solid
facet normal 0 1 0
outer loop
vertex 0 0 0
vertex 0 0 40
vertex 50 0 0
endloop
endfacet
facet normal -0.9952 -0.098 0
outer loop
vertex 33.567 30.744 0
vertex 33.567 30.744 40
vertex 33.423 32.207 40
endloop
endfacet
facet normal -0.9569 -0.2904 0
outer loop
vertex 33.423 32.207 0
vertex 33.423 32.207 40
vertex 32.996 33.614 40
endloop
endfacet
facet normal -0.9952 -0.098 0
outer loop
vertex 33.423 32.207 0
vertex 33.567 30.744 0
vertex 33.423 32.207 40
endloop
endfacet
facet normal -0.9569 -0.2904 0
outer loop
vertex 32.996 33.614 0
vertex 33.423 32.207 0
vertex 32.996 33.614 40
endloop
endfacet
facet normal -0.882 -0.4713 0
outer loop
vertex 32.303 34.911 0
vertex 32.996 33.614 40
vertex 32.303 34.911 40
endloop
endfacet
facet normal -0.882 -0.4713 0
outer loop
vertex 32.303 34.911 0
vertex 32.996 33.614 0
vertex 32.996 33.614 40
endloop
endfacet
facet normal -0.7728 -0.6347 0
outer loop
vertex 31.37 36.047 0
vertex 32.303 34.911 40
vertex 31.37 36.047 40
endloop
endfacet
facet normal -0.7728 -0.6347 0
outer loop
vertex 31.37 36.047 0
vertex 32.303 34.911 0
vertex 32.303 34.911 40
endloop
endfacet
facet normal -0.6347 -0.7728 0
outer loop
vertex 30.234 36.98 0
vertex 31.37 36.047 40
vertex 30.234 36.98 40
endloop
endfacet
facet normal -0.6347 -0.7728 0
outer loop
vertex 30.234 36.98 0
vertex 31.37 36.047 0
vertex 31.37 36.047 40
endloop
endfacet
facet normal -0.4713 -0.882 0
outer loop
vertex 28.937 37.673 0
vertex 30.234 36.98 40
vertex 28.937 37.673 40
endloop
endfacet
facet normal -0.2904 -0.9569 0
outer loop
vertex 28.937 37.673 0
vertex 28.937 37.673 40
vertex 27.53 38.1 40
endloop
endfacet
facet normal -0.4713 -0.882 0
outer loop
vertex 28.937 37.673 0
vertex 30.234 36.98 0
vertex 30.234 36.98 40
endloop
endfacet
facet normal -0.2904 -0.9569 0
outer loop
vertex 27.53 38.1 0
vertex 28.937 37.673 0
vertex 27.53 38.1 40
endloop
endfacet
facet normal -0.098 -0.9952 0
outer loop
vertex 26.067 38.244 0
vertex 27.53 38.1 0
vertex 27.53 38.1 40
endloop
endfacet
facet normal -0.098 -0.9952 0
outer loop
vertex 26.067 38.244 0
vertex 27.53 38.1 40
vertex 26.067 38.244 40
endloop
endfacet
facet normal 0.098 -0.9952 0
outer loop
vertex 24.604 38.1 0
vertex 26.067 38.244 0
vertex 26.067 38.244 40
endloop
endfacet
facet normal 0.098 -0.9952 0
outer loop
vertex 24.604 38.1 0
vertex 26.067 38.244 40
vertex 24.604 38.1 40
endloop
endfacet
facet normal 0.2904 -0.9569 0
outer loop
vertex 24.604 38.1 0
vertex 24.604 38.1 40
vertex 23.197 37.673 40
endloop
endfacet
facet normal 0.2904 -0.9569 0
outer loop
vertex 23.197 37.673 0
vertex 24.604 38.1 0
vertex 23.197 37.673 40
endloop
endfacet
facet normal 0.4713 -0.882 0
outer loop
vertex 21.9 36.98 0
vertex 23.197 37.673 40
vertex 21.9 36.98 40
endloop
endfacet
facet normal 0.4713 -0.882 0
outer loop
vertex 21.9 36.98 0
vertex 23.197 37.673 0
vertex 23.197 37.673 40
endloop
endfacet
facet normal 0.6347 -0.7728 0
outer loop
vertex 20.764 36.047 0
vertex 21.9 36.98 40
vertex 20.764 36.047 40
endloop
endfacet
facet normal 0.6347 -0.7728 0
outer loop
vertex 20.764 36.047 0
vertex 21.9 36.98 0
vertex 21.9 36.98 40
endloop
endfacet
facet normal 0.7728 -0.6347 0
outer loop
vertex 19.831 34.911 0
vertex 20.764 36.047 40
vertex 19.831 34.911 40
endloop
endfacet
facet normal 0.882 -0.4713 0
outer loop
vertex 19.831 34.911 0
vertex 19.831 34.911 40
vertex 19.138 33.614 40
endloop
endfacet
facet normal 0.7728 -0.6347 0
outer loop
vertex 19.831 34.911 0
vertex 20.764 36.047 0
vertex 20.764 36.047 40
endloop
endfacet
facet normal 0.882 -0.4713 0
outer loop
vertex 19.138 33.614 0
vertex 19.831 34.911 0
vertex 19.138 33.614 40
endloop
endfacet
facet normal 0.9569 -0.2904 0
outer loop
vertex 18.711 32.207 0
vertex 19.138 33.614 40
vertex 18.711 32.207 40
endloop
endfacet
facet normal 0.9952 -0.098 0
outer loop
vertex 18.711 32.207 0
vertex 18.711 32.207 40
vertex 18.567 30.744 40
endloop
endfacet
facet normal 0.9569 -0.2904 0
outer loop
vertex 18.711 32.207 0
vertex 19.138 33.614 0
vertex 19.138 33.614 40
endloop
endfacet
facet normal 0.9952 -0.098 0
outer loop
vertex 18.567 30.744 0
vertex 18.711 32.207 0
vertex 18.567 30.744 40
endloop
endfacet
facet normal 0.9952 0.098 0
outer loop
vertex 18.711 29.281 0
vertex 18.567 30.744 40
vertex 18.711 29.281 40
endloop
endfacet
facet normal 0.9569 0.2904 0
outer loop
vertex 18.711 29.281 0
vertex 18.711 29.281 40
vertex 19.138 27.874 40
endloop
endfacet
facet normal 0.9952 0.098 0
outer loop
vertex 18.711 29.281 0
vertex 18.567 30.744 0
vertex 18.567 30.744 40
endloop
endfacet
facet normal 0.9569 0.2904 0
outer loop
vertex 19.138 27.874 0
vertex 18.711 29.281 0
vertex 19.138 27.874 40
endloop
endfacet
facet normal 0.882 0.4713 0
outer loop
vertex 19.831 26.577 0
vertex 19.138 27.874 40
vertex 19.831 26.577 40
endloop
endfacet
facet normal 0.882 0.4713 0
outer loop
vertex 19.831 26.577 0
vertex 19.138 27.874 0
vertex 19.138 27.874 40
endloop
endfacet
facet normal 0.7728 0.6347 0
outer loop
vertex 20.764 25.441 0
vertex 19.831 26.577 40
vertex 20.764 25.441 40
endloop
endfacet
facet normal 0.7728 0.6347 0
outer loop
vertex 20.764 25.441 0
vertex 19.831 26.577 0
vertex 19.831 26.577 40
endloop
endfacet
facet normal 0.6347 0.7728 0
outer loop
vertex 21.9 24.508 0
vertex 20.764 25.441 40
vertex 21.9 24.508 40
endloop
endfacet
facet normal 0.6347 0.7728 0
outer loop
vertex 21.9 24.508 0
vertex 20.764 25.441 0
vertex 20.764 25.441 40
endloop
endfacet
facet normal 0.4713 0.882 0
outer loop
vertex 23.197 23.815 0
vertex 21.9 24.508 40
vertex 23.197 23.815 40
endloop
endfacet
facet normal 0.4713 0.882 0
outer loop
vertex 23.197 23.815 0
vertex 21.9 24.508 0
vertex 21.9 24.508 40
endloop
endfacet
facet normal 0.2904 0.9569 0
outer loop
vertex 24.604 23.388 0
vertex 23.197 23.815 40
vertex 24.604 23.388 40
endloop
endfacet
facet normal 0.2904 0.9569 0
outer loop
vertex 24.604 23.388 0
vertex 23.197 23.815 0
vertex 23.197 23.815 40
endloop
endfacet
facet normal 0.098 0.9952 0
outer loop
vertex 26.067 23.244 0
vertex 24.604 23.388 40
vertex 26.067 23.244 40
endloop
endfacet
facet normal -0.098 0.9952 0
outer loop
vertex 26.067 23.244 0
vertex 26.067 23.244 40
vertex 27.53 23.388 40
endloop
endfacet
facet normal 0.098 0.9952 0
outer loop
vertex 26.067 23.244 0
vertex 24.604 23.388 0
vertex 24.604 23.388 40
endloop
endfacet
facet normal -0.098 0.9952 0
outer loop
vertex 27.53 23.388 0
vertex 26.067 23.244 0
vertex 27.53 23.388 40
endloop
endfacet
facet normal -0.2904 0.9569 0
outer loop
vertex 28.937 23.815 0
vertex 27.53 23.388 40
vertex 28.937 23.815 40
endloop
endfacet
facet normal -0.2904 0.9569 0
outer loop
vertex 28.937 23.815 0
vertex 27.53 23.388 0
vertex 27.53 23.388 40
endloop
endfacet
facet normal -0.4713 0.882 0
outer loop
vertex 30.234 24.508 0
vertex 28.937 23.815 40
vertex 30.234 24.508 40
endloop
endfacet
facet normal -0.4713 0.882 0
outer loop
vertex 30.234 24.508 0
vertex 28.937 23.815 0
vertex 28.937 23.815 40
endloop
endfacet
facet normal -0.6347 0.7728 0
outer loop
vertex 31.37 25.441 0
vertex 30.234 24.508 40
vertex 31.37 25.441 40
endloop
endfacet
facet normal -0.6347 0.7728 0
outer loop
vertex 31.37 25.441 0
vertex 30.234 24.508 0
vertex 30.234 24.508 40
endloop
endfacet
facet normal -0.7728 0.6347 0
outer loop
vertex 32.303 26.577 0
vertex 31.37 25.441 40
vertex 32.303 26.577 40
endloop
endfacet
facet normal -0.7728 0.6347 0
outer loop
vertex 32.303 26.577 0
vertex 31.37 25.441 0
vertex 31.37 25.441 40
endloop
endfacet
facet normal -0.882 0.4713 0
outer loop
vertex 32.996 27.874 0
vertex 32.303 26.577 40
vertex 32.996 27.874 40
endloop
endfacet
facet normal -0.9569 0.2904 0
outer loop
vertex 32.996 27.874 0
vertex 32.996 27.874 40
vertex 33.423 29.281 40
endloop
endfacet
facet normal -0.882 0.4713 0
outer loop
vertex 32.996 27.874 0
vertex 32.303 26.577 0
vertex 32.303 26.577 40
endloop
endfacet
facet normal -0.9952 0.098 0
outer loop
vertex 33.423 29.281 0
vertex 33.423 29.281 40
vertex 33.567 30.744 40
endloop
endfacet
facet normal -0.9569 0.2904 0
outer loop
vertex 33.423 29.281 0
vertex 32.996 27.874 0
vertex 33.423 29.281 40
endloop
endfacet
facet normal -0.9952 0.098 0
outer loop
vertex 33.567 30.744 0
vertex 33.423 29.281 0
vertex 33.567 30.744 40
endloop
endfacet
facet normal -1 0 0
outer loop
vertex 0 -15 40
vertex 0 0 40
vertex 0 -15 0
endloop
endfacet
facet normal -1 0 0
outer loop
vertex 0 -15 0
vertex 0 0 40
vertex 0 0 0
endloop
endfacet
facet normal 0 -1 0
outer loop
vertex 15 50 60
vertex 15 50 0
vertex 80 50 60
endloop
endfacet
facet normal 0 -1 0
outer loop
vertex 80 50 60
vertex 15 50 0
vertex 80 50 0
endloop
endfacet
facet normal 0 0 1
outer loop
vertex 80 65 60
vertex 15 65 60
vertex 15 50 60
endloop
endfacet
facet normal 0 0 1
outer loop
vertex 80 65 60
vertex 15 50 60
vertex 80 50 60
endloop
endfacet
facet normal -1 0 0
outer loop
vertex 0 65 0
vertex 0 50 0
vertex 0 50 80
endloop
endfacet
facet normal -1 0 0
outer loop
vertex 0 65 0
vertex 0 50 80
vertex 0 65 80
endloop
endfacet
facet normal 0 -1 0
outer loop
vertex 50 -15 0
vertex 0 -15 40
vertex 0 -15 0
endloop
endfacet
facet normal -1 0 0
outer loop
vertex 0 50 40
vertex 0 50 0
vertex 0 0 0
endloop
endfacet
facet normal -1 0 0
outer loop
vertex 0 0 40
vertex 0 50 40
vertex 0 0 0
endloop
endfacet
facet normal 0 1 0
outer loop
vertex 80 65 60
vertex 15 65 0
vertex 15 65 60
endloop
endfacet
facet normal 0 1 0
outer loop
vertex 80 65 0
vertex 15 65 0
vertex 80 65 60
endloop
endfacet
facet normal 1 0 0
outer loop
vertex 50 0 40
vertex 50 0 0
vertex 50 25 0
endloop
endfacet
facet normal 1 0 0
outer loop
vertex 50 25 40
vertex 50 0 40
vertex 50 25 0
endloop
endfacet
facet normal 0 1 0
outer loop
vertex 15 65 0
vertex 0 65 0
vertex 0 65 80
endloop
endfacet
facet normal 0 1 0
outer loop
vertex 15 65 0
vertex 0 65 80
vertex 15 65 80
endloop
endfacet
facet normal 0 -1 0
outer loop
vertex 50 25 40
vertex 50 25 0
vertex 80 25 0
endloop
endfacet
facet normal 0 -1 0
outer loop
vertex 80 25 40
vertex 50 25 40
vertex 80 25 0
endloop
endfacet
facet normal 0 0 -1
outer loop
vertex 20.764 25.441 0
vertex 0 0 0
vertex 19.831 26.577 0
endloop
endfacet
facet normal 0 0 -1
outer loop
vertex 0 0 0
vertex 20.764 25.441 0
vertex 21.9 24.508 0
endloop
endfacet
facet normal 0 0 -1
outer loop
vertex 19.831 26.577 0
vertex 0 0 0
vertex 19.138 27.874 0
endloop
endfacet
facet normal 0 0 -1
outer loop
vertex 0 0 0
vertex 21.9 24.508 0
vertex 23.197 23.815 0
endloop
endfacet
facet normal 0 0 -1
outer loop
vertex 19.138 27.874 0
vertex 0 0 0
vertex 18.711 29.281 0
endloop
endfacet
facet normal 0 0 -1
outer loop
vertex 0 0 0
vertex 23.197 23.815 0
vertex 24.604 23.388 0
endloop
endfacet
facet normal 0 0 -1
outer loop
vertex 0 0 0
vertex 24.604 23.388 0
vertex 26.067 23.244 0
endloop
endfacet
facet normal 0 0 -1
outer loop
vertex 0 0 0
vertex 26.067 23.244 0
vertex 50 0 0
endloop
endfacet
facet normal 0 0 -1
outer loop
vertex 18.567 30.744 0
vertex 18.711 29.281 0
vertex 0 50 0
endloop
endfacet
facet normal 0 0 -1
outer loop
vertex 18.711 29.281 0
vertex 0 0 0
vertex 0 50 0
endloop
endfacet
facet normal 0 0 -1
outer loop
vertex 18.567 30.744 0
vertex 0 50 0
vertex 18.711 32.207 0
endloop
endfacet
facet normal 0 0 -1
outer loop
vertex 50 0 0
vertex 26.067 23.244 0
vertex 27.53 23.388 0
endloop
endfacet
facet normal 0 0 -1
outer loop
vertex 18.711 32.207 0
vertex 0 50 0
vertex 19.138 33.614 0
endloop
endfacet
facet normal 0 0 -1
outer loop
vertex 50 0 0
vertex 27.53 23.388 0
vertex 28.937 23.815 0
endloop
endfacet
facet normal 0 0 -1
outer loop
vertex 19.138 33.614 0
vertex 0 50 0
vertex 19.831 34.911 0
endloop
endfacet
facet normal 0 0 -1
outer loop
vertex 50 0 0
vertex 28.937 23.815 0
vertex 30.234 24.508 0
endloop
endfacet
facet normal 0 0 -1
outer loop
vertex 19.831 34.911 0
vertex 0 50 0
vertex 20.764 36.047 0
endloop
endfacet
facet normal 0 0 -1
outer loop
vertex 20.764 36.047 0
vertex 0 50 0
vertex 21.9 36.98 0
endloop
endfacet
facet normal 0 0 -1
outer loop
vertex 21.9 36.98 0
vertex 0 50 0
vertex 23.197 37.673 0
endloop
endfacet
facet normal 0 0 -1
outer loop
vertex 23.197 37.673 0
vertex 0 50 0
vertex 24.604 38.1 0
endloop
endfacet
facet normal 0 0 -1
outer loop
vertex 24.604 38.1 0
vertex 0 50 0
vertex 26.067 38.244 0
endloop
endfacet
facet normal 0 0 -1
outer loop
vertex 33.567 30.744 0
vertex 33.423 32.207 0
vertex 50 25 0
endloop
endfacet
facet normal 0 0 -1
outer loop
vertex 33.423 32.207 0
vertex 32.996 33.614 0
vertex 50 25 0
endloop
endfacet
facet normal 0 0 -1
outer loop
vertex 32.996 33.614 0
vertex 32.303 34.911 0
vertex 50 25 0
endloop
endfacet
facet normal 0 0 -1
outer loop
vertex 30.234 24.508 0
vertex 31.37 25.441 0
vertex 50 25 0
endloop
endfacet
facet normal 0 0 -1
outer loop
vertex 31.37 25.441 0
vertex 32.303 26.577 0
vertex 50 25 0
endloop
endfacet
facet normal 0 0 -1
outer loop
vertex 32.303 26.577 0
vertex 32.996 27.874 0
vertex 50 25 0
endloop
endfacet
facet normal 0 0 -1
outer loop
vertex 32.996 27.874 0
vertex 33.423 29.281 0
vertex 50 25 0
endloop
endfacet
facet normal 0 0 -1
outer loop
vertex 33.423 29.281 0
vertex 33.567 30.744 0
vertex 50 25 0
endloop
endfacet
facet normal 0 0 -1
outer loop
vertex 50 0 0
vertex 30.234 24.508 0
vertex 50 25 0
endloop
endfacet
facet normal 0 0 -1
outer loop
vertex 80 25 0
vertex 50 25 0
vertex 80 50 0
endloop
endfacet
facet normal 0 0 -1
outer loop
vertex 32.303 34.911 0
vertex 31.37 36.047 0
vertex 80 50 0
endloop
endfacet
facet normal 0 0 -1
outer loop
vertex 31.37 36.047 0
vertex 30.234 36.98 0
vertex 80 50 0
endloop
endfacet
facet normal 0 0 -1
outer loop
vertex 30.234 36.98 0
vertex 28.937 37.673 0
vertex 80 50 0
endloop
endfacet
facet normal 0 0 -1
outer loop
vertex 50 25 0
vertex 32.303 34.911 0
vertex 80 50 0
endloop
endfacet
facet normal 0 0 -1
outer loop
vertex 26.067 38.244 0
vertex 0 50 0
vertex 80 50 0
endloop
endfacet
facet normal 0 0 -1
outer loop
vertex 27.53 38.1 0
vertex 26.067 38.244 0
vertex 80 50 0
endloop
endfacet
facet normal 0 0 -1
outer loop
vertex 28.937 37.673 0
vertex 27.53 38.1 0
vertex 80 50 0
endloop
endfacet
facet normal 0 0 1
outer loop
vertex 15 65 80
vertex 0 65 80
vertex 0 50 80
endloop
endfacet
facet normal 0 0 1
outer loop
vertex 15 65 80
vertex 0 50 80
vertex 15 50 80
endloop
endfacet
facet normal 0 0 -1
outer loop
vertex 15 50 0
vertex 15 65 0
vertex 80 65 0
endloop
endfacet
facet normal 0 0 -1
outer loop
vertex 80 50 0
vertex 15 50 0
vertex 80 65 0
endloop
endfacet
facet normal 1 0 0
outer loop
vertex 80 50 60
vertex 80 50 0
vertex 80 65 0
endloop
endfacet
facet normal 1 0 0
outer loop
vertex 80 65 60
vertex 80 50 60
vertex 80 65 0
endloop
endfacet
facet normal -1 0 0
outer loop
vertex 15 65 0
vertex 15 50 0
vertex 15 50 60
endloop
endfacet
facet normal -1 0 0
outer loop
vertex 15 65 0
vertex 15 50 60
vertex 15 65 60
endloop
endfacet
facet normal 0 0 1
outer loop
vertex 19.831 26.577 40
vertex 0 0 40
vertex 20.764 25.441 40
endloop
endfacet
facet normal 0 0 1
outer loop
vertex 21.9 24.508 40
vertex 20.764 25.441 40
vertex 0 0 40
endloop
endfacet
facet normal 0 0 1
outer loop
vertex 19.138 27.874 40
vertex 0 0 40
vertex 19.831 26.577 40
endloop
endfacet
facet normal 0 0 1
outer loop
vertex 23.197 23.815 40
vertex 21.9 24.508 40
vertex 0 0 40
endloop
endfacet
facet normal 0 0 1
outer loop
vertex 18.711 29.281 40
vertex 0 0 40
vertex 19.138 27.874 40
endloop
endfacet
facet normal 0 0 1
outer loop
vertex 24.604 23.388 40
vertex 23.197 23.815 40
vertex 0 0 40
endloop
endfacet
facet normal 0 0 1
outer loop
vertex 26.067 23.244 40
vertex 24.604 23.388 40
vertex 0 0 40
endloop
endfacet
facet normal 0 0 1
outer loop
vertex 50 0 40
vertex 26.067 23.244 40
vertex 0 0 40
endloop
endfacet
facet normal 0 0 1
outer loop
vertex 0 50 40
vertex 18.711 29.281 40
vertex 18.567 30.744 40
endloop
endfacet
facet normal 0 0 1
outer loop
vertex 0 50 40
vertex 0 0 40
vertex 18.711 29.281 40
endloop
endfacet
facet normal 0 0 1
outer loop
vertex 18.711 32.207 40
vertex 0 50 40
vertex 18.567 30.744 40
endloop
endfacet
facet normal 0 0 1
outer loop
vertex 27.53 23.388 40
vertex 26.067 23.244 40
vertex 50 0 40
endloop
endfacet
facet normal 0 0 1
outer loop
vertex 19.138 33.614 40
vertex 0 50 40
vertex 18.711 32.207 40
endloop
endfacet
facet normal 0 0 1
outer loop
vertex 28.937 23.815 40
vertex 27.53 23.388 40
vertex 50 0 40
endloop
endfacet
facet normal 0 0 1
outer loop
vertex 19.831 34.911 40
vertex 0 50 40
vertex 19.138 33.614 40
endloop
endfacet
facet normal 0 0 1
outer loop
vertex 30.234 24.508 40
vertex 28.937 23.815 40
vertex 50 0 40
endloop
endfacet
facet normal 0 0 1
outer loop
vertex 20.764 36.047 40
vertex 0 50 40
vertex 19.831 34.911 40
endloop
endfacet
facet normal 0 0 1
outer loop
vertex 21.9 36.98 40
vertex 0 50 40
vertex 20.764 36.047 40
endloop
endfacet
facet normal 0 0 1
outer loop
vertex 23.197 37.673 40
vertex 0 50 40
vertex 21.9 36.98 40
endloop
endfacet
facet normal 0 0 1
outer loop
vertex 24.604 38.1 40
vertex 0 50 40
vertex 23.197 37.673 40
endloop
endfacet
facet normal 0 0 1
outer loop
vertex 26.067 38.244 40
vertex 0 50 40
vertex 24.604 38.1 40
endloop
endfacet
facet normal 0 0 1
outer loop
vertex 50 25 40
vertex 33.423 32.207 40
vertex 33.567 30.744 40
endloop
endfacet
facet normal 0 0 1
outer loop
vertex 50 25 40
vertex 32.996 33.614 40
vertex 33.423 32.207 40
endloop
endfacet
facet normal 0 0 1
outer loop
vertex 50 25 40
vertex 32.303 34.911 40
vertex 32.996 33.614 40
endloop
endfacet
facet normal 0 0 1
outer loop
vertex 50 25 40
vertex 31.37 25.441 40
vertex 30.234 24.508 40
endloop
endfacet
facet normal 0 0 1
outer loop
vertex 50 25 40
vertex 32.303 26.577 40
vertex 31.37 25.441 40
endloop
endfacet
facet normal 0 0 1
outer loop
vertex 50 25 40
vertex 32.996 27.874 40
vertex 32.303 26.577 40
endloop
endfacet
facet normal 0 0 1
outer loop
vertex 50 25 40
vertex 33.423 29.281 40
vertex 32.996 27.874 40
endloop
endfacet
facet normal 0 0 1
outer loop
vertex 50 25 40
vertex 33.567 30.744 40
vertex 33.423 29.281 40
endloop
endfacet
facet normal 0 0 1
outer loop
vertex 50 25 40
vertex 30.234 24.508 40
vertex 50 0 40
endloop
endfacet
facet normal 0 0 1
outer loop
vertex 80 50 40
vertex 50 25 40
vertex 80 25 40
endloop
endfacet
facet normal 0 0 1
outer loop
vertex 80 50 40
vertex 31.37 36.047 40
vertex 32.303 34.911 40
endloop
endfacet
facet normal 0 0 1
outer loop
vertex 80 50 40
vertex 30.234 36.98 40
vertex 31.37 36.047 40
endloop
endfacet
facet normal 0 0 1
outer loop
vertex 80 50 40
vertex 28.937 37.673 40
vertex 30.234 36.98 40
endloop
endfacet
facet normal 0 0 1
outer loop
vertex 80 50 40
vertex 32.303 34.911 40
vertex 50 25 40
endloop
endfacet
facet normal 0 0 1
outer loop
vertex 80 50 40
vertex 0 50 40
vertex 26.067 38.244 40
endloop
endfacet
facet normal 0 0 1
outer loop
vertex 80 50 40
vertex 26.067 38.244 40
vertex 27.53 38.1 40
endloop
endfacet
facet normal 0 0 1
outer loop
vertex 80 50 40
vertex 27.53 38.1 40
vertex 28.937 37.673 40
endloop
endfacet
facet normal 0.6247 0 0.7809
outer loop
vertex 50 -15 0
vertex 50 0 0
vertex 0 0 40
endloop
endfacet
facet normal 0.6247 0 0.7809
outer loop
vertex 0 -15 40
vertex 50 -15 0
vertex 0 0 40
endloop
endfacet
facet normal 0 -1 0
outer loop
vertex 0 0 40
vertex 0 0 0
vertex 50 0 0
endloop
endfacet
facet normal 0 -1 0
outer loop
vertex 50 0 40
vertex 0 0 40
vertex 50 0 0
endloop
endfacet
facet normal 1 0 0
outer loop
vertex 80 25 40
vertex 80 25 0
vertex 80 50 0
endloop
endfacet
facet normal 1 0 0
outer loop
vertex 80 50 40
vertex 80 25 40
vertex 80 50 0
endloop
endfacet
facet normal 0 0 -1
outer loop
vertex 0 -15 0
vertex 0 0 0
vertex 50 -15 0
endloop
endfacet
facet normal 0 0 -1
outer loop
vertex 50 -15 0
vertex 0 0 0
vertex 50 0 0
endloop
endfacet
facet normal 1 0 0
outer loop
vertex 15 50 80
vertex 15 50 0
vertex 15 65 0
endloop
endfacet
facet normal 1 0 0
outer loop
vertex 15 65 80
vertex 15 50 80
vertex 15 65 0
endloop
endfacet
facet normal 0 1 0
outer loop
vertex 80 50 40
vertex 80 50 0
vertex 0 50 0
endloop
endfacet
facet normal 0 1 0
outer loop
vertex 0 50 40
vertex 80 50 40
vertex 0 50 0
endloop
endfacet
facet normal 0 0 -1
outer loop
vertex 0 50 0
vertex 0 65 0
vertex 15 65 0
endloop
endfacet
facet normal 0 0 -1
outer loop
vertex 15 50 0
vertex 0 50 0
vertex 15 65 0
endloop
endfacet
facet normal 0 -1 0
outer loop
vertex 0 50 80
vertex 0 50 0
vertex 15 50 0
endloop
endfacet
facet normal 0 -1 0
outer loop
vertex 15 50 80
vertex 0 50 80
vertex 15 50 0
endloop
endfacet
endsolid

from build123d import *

# Parameters (mm, degrees)
F1_DEPTH = 15
F3_DEPTH = 40
F4_W     = 15
F4_H     = 15
F5_DEPTH = 80
F6_W     = 65
F6_H     = 15
F7_DEPTH = 60
F8_R     = 7.5
F9_DEPTH = 40


with BuildPart() as f1:
    # F0 (on Front) → F1 (new body)
    with BuildSketch(Plane.XZ):
        Polygon((0, 40), (0, 0), (50, 0), align=None)
    extrude(amount=F1_DEPTH)


with BuildPart() as f3:
    # F2 (on Top) → F3 (new body)
    with BuildSketch(Plane.XY):
        Polygon((0, 50), (0, 0), (50, 0), (50, 25), (80, 25), (80, 50), align=None)
    extrude(amount=F3_DEPTH)

    # F8 (on Top) → F9 (cut, through all)
    with BuildSketch(Plane.XY):
        with Locations((26.066808, 30.744)):
            Circle(F8_R)
    extrude(amount=F9_DEPTH, mode=Mode.SUBTRACT)


with BuildPart() as f5:
    # F4 (on Top) → F5 (new body)
    with BuildSketch(Plane.XY):
        with Locations((7.5, 57.5)):
            Rectangle(F4_W, F4_H)
    extrude(amount=F5_DEPTH)


with BuildPart() as f7:
    # F6 (on Top) → F7 (new body)
    with BuildSketch(Plane.XY):
        with Locations((47.5, 57.5)):
            Rectangle(F6_W, F6_H)
    extrude(amount=F7_DEPTH)


solid = Compound([f1.part, f3.part, f5.part, f7.part])
